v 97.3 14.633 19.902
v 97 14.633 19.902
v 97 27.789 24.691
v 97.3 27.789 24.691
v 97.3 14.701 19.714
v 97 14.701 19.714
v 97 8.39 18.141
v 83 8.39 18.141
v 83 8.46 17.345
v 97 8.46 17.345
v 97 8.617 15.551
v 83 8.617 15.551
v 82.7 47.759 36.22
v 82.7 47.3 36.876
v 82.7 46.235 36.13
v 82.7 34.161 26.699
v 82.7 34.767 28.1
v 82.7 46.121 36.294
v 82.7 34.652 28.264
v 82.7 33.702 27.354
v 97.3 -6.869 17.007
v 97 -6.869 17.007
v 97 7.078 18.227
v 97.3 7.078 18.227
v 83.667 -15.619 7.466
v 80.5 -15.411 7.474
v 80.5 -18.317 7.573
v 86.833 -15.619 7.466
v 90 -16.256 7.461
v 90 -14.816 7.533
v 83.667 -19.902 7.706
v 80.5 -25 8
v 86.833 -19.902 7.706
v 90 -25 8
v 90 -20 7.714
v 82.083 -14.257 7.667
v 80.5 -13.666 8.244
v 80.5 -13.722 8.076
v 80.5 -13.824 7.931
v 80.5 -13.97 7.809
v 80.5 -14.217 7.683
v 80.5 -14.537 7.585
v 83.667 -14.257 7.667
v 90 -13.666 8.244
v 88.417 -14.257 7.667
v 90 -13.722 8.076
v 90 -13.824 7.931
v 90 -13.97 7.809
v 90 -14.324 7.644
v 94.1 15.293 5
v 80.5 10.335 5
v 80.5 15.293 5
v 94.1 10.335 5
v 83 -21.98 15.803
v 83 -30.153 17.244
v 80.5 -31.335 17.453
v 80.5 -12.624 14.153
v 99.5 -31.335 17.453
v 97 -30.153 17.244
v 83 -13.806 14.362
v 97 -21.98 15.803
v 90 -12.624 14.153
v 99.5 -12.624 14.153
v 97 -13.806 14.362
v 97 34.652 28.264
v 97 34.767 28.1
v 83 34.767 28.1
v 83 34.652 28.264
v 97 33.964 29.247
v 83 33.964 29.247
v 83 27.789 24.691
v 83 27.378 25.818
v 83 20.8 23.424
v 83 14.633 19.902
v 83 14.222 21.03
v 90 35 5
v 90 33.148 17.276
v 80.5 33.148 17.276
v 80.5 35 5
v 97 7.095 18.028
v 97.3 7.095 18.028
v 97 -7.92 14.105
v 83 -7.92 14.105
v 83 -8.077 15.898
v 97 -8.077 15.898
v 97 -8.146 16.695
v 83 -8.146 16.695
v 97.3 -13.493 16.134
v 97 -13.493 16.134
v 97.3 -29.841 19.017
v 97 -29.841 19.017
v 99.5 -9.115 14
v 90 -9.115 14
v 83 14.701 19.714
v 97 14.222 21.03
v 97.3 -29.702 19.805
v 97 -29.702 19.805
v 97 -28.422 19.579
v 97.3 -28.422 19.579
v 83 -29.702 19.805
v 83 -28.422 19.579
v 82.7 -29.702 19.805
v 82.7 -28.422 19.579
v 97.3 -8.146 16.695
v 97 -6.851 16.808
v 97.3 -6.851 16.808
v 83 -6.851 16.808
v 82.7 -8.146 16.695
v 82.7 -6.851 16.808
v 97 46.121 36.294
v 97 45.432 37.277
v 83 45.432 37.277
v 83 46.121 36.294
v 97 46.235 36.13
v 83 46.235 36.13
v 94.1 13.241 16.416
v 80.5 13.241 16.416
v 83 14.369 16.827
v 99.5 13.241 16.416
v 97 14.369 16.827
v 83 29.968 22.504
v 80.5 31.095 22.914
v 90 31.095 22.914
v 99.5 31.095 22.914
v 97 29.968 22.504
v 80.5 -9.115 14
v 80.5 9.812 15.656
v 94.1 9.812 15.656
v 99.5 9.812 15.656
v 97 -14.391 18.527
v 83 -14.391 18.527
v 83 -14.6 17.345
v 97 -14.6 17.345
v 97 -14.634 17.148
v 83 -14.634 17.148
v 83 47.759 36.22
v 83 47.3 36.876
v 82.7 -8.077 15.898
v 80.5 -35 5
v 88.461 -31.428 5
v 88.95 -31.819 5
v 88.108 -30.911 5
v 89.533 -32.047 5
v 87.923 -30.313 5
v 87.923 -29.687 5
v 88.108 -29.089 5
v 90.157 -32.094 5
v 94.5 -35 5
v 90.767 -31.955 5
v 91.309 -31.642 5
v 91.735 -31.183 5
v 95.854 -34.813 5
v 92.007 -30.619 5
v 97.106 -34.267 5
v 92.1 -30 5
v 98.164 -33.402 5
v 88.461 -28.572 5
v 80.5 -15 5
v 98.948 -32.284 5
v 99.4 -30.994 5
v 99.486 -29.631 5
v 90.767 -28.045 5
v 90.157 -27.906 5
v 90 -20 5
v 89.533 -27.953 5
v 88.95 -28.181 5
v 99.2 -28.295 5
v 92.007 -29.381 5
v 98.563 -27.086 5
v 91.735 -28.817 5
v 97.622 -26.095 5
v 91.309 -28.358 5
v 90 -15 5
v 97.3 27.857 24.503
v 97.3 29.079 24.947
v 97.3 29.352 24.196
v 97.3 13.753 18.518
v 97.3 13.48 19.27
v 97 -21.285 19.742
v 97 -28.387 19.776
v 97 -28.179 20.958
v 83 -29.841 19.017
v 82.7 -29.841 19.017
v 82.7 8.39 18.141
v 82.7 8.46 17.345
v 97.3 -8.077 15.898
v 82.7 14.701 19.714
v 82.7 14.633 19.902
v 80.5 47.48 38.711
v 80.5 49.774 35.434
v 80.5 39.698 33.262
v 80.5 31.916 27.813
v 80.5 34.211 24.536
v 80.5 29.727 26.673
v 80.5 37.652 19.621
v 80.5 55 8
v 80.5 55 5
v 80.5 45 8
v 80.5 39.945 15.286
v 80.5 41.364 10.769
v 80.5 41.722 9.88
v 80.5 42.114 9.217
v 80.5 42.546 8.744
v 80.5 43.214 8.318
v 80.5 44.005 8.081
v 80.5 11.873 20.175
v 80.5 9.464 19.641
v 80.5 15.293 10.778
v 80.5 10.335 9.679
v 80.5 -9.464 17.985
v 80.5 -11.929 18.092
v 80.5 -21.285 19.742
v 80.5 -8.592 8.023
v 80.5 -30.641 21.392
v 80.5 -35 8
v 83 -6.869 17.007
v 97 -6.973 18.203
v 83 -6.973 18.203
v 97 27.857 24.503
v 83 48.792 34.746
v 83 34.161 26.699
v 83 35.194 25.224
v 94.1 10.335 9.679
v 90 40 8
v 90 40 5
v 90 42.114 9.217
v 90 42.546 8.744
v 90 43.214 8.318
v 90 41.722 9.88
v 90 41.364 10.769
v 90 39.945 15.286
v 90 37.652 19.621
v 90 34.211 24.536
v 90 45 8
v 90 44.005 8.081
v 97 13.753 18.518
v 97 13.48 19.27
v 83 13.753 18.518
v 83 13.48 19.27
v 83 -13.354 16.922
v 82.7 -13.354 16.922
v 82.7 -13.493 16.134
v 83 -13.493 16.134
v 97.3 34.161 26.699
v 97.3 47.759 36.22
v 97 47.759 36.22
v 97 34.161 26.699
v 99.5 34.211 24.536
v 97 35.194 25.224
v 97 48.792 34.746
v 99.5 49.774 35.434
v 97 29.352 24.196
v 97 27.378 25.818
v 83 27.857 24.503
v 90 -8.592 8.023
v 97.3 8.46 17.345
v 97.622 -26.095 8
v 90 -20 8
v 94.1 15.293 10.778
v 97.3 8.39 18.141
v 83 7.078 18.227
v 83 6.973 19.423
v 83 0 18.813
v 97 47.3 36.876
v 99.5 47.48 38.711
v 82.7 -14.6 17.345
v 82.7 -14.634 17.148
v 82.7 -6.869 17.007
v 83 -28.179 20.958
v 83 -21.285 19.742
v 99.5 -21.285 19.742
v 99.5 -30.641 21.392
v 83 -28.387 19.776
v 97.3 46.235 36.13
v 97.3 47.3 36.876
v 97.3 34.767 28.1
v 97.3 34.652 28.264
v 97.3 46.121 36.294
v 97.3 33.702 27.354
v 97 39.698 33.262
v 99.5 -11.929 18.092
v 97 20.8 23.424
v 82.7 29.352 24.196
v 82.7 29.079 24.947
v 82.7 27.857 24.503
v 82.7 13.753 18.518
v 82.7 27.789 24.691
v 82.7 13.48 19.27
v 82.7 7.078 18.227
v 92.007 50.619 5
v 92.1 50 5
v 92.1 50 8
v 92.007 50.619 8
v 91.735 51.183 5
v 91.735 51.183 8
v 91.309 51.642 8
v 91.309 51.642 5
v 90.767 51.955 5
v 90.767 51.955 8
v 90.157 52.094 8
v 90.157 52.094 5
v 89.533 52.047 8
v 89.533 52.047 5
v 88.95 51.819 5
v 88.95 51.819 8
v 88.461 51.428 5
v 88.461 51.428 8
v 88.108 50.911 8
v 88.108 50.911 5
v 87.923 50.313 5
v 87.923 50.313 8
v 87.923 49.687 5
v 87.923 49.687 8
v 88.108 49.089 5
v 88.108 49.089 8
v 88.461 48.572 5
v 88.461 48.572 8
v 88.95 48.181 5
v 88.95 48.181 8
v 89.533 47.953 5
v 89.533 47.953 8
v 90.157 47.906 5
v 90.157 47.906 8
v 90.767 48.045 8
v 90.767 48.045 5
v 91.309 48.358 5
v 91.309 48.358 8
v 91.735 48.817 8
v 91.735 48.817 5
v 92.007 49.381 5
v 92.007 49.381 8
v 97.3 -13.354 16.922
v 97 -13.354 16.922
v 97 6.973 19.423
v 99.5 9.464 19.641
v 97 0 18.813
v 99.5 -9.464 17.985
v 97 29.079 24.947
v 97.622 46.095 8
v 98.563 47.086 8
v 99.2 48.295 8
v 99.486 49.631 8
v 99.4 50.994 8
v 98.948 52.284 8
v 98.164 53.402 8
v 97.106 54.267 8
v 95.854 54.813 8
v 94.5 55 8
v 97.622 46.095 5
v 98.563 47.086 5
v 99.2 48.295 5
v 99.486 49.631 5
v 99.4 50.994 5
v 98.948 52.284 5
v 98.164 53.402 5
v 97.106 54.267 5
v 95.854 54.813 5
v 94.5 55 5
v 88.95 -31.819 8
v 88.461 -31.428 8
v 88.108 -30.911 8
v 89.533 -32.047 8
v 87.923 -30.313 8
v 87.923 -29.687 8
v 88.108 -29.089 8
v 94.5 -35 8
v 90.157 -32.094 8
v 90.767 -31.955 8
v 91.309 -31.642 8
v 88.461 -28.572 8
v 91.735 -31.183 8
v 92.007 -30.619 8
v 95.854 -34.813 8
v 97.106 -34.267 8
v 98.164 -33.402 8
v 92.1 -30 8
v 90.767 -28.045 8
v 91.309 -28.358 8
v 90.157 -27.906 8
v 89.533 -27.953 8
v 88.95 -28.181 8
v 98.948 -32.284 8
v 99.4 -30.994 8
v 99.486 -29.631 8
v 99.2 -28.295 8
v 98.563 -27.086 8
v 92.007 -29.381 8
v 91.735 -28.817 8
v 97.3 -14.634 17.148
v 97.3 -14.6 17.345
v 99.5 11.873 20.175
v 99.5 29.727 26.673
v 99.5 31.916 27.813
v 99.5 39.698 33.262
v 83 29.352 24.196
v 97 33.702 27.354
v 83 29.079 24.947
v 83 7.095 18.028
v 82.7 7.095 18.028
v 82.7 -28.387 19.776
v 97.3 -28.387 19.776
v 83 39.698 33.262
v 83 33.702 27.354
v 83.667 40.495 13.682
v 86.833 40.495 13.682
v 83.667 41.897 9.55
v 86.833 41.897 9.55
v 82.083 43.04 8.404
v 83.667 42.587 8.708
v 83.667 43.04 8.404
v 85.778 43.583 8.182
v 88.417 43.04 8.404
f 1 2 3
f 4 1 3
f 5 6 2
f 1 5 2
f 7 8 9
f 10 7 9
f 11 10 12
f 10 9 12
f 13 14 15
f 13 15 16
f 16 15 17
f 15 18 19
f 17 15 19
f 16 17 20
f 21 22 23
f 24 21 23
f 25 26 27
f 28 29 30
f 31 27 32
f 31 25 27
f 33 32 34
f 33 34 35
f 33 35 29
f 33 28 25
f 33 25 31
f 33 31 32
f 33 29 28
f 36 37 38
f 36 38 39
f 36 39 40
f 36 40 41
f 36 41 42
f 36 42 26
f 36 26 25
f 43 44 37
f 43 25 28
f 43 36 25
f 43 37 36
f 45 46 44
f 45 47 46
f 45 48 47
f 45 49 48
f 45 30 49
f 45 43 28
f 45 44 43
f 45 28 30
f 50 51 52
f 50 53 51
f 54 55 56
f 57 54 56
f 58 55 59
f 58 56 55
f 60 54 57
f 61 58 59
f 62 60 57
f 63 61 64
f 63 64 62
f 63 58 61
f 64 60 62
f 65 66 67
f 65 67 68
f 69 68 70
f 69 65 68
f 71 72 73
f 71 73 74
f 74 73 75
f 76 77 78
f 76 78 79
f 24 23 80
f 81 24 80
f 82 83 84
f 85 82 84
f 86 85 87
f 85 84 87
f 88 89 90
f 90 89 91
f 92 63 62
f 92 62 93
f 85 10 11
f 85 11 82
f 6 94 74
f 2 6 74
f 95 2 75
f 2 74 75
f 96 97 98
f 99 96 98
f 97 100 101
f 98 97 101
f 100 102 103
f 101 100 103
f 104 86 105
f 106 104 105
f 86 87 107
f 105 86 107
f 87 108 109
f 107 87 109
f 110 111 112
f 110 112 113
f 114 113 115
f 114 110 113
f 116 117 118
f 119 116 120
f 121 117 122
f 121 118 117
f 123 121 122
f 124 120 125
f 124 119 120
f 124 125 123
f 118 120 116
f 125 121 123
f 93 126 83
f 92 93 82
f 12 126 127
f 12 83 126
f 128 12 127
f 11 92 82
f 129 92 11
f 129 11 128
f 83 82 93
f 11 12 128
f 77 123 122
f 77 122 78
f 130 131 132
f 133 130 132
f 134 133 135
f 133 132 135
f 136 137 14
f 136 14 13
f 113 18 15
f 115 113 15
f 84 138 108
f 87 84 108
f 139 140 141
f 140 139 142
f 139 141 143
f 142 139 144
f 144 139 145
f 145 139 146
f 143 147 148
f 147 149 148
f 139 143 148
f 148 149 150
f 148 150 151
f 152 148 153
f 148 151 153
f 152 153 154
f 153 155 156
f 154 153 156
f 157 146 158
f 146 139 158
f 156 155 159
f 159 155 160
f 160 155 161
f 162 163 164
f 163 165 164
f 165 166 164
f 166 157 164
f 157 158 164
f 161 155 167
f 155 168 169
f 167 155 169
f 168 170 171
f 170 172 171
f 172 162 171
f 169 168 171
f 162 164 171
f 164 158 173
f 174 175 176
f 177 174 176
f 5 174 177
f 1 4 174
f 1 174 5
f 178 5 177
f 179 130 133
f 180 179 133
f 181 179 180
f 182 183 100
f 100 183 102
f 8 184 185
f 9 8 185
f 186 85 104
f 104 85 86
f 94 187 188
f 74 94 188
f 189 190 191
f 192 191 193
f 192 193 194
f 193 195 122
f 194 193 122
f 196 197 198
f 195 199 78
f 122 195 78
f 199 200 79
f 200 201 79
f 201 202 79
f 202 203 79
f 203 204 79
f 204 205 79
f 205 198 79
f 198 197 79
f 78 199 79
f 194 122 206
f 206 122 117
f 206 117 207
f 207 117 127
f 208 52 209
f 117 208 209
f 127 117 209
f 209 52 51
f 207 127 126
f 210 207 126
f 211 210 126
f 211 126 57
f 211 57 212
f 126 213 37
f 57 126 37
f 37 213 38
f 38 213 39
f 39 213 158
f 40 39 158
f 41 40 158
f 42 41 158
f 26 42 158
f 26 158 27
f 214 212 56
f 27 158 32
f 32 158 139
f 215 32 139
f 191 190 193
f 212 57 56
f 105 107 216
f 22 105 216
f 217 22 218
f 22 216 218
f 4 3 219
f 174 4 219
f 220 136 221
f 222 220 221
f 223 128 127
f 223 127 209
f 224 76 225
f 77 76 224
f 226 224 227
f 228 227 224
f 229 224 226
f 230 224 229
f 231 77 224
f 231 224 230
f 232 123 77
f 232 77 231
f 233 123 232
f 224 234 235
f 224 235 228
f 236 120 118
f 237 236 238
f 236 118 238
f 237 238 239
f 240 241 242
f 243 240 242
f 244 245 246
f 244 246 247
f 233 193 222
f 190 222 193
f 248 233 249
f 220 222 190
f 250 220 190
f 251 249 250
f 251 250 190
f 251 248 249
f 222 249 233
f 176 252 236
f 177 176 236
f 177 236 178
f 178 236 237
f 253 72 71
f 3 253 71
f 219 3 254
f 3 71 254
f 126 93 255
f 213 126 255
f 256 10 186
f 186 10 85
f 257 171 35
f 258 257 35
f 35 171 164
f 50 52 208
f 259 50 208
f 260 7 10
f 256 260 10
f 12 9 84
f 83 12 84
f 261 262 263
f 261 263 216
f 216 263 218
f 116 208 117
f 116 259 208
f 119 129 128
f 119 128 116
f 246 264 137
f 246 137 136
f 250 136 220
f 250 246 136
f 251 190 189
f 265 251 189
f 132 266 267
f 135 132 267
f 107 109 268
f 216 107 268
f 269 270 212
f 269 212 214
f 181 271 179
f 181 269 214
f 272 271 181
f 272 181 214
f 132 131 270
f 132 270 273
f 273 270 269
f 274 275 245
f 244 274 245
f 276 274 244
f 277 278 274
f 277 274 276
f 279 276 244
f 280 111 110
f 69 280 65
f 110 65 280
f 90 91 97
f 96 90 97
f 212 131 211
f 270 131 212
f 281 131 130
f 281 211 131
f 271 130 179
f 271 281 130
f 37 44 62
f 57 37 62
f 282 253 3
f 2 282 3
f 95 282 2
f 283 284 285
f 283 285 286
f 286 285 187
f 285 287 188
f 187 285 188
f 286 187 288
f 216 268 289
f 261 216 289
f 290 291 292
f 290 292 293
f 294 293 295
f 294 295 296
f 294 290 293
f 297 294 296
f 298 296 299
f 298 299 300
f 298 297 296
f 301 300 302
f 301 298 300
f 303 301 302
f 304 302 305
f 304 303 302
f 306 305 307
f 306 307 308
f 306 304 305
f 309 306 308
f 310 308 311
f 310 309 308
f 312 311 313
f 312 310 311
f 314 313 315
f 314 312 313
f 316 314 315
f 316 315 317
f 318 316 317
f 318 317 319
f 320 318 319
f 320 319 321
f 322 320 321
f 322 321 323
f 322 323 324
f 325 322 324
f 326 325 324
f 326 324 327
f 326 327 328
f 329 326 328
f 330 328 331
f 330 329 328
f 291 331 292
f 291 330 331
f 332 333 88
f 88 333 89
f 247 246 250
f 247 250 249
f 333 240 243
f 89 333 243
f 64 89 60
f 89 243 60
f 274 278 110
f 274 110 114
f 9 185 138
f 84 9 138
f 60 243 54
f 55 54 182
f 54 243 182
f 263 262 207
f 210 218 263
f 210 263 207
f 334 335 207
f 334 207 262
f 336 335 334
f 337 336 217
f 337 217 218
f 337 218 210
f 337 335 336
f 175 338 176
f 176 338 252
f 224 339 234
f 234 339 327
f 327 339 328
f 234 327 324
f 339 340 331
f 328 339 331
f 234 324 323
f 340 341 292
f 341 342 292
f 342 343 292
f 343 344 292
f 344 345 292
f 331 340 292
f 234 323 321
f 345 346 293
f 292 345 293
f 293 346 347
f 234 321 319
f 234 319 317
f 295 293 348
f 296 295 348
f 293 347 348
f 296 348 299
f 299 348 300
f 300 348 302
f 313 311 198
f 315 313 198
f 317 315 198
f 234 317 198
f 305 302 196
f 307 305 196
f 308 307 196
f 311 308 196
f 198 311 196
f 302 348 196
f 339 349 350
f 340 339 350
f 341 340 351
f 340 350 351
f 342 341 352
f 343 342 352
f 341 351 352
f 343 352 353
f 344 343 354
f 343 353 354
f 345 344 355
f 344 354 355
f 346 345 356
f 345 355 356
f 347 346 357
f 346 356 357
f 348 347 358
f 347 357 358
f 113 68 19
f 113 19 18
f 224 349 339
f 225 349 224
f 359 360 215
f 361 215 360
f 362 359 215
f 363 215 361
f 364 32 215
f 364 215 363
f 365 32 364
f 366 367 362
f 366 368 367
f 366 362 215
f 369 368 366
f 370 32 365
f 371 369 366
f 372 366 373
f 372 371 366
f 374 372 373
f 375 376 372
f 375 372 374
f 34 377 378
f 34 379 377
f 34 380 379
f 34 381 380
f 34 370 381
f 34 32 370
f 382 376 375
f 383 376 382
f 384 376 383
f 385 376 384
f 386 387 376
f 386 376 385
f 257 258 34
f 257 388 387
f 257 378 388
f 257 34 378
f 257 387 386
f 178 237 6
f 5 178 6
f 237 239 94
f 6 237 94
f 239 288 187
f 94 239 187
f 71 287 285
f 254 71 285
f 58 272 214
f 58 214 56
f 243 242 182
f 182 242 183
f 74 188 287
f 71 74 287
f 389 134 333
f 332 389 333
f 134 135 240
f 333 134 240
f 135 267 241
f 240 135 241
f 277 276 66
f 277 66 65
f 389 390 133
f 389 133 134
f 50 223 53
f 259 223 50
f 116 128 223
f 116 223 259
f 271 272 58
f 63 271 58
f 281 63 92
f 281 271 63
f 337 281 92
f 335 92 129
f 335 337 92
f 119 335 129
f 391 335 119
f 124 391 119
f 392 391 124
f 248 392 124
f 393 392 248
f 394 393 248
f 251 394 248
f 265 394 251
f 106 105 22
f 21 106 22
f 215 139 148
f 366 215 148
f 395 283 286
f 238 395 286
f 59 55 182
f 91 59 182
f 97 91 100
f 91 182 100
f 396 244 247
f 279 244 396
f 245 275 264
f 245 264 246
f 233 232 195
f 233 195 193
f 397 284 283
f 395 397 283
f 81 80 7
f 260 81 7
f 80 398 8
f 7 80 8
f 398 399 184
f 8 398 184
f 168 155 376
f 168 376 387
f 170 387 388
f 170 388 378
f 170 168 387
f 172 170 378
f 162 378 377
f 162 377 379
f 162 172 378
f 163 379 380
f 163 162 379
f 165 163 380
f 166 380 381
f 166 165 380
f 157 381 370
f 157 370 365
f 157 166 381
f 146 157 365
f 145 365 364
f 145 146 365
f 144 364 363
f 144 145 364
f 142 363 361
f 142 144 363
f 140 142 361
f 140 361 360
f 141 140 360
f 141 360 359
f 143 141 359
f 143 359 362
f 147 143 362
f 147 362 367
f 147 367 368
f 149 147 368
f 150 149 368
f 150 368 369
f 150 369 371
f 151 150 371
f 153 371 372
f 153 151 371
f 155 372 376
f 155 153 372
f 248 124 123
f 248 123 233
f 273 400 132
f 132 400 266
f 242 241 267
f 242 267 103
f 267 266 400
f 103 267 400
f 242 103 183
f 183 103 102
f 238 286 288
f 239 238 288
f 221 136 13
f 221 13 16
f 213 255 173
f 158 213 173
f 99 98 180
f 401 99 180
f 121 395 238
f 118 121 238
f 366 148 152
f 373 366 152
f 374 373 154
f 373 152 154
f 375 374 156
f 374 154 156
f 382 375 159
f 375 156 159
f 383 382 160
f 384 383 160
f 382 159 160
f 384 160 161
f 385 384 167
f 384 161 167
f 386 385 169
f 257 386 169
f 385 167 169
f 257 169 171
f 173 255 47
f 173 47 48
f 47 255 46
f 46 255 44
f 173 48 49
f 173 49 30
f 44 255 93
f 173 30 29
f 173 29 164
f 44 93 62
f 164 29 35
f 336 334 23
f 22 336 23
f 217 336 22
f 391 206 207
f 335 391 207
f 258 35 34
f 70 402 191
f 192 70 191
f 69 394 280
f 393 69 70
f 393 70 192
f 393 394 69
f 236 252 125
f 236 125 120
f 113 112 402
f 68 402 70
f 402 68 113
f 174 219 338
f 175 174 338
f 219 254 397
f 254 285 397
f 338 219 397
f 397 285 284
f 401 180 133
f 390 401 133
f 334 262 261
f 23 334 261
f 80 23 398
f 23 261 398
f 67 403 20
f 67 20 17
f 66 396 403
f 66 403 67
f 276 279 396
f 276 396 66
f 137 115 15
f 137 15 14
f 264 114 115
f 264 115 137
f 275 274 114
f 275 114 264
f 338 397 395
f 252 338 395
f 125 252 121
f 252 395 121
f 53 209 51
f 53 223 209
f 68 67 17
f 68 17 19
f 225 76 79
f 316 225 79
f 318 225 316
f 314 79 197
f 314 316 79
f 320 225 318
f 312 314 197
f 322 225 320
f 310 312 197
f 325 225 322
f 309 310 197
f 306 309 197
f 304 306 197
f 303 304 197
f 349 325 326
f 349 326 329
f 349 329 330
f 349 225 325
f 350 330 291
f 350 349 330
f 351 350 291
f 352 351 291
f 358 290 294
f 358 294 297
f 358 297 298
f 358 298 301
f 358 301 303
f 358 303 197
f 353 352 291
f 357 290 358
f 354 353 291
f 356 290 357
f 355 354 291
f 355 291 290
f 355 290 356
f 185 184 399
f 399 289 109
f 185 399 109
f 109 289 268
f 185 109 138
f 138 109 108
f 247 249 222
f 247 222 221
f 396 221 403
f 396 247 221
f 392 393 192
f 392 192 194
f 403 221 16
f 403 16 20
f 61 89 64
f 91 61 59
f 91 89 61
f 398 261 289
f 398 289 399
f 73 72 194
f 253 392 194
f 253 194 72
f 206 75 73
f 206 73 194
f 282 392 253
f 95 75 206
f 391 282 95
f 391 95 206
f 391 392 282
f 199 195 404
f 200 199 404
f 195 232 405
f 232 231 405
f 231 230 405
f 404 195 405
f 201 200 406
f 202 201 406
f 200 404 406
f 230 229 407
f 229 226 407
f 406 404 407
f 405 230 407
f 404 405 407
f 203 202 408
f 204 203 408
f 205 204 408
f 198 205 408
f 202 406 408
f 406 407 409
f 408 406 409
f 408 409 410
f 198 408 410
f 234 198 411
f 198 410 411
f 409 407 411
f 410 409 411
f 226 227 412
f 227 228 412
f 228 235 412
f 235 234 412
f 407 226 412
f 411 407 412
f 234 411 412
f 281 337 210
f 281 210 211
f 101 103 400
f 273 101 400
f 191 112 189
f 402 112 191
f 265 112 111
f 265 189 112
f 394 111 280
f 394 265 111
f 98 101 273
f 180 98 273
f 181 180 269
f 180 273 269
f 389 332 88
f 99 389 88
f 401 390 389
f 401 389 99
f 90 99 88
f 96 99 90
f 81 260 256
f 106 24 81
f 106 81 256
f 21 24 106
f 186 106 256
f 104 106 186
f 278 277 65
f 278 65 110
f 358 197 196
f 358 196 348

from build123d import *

# Parameters (mm, degrees)
PAD016_DEPTH      = 9.5
POCKET008_DEPTH   = 7
POCKET009_DEPTH   = 7.3
PAD017_DEPTH      = 4.1
PAD017_DEPTH_BACK = 9.5
PAD018_DEPTH      = 9.5
SKETCH031_R       = 2.1
PAD019_DEPTH      = 3


with BuildPart() as part:
    # Sketch026 → Pad016 (new body, symmetric)
    with BuildSketch(Plane.YZ):
        Polygon((47.4801846947, 33.7107123063), (39.698240274, 28.2617361609), (31.9162958532, 22.8127600156), (29.7273220428, 21.6732523754), (20.8002421453, 18.4240610138), (11.8731622478, 15.1748696522), (9.4638496319, 14.6407379046), (0, 13.8127583485), (-9.4638496319, 12.9847787924), (-11.9293103801, 13.0924231333), (-21.2849840337, 14.7420808212), (-30.6406576873, 16.391738509), (-31.335250398, 12.452507497), (-12.6239030908, 9.1531921213), (-9.1152266609, 9), (9.8124726029, 10.6559591122), (13.2412428211, 11.416099169), (31.0954026161, 17.9144818922), (34.2106015986, 19.5361518385), (49.7744904401, 30.4341041291), align=None)
    extrude(amount=PAD016_DEPTH, both=True)

    # Sketch027 → Pocket008 (cut, symmetric)
    with BuildSketch(Plane.YZ):
        Polygon((-28.1786383048, 15.9576180648), (-21.2849840337, 14.7420808212), (-14.3913297626, 13.5265435775), (-14.6344372114, 12.1478127233), (-13.3541871324, 11.9220700923), (-13.8056723944, 9.3615699345), (-21.9795767444, 10.8028498091), (-30.1534810944, 12.2441296838), (-29.7019958324, 14.8046298416), (-28.4217457535, 14.5788872106), align=None)
        Polygon((-6.9733628866, 13.2026681492), (0, 13.8127583485), (6.9733628866, 14.4228485477), (7.0953809265, 13.0281759704), (8.390434034, 13.1414784359), (8.6170389652, 10.5513722209), (0.348622971, 9.8279795561), (-7.9197930232, 9.1045868913), (-8.1463979543, 11.6946931063), (-6.8513448468, 11.8079955719), align=None)
        Polygon((14.2223937998, 16.0299200105), (20.8002421453, 18.4240610138), (27.3780904908, 20.818202017), (27.8569186914, 19.5026323479), (29.0785190985, 19.9472585343), (29.9677714711, 17.5040577202), (22.1683227186, 14.6652905306), (14.3688739661, 11.826523341), (13.4796215934, 14.2697241551), (14.7012220004, 14.7143503414), align=None)
        Polygon((33.964175964, 24.2467011065), (39.698240274, 28.2617361609), (45.432304584, 32.2767712154), (46.2353115949, 31.1299583534), (47.3002092525, 31.8756077207), (48.791507987, 29.7458124055), (41.9925460194, 24.9851279838), (35.1935840518, 20.2244435621), (33.7022853173, 22.3542388772), (34.7671829748, 23.0998882445), align=None)
    extrude(amount=POCKET008_DEPTH, both=True, mode=Mode.SUBTRACT)

    # Sketch028 → Pocket009 (cut, symmetric)
    with BuildSketch(Plane.YZ):
        Polygon((-28.387016118, 14.7758487612), (-14.5997075758, 12.3447742739), (-14.6344372114, 12.1478127233), (-13.3541871324, 11.9220700923), (-13.4931056746, 11.1342238899), (-29.8409143746, 14.0167836392), (-29.7019958324, 14.8046298416), (-28.4217457535, 14.5788872106), align=None)
        Polygon((-6.8687759953, 12.0072345115), (7.0779497779, 13.22741491), (7.0953809265, 13.0281759704), (8.390434034, 13.1414784359), (8.4601586282, 12.3445226775), (-8.0766733601, 10.8977373479), (-8.1463979543, 11.6946931063), (-6.8513448468, 11.8079955719), align=None)
        Polygon((14.6328179718, 14.9022888655), (27.7885146628, 19.6905708721), (27.8569186914, 19.5026323479), (29.0785190985, 19.9472585343), (29.3521352131, 19.1955044376), (13.7532377081, 13.5179700584), (13.4796215934, 14.2697241551), (14.7012220004, 14.7143503414), align=None)
        Polygon((34.6524676876, 23.2637186533), (46.1205963076, 31.2937887623), (46.2353115949, 31.1299583534), (47.3002092525, 31.8756077207), (47.7590704016, 31.2202860852), (34.1611464664, 21.6989172418), (33.7022853173, 22.3542388772), (34.7671829748, 23.0998882445), align=None)
    extrude(amount=POCKET009_DEPTH, both=True, mode=Mode.SUBTRACT)

    # Sketch029 → Pad017 (join, two sides)
    with BuildSketch(Plane.YZ) as pad017_sk:
        Polygon((9.4638496319, 14.6407379046), (9.8124726029, 10.6559591122), (10.3354070593, 4.6787909237), (10.3354070593, 0), (15.2933636811, 0), (15.2933636811, 5.7779434443), (13.2412428211, 11.416099169), (11.8731622478, 15.1748696522), align=None)
    extrude(amount=PAD017_DEPTH)
    extrude(pad017_sk.sketch, amount=-PAD017_DEPTH_BACK)

    # Sketch030 → Pad018 (join)
    with BuildSketch(Plane.YZ):
        with BuildLine():
            Line((-13.6657921568, 3.2443456032), (-12.6239030908, 9.1531921213))
            Line((-12.6239030908, 9.1531921213), (-11.9293103801, 13.0924231333))
            Line((-11.9293103801, 13.0924231333), (-9.4638496319, 12.9847787924))
            Line((-9.4638496319, 12.9847787924), (-9.1152266609, 9))
            Line((-9.1152266609, 9), (-8.5922922044, 3.0228318114))
            Line((-8.5922922044, 3.0228318114), (-15, 0))
            Line((-15, 0), (-25, 0))
            Line((-25, 0), (-25, 3))
            add(Edge.make_bspline(
                [(-13.6657921568, 3.2443456032), (-13.9496356176, 1.6345893441), (-20, 3), (-25, 3)],
                knots=[0, 0, 0, 0, 1, 1, 1, 1], degree=3))
        make_face()
        with BuildLine():
            Line((37.6520602167, 14.6212395727), (34.2106015986, 19.5361518385))
            Line((34.2106015986, 19.5361518385), (31.9162958532, 22.8127600156))
            Line((31.9162958532, 22.8127600156), (29.7273220428, 21.6732523754))
            Line((29.7273220428, 21.6732523754), (31.0954026161, 17.9144818922))
            Line((31.0954026161, 17.9144818922), (33.147523476, 12.2763261675))
            Line((33.147523476, 12.2763261675), (35, 0))
            Line((35, 0), (45, 0))
            Line((45, 0), (45, 3))
            add(Edge.make_bspline(
                [(37.6520602167, 14.6212395727), (42.2621193459, 8.0373928164), (40, 3), (45, 3)],
                knots=[0, 0, 0, 0, 1, 1, 1, 1], degree=3))
        make_face()
    extrude(amount=-PAD018_DEPTH)

    # Sketch031 → Pad019 (join)
    with BuildSketch(Plane.XY):
        with BuildLine():
            Line((7.6224992299, -26.0948753465), (0, -20))
            Line((0, -20), (0, -25))
            Line((0, -25), (-9.5, -25))
            Line((-9.5, -25), (-9.5, -35))
            Line((-9.5, -35), (4.5, -35))
            ThreePointArc((4.5, -35), (9.218348401, -31.6544450327), (7.6224992299, -26.0948753465))
        make_face()
        with Locations((0, -30)):
            Circle(SKETCH031_R, mode=Mode.SUBTRACT)
        with BuildLine():
            Line((0, 45), (-9.5, 45))
            Line((-9.5, 45), (-9.5, 55))
            Line((-9.5, 55), (4.5, 55))
            ThreePointArc((7.6224992299, 46.0948753465), (9.218348401, 51.6544450327), (4.5, 55))
            Line((7.6224992299, 46.0948753465), (0, 40))
            Line((0, 40), (0, 45))
        make_face()
        with Locations((0, 50)):
            Circle(SKETCH031_R, mode=Mode.SUBTRACT)
    extrude(amount=PAD019_DEPTH)


with BuildPart() as part_1:
    # Body004 placement: moved
    add(part.part.moved(Location((90, 0, 5))))


solid = part_1.part
